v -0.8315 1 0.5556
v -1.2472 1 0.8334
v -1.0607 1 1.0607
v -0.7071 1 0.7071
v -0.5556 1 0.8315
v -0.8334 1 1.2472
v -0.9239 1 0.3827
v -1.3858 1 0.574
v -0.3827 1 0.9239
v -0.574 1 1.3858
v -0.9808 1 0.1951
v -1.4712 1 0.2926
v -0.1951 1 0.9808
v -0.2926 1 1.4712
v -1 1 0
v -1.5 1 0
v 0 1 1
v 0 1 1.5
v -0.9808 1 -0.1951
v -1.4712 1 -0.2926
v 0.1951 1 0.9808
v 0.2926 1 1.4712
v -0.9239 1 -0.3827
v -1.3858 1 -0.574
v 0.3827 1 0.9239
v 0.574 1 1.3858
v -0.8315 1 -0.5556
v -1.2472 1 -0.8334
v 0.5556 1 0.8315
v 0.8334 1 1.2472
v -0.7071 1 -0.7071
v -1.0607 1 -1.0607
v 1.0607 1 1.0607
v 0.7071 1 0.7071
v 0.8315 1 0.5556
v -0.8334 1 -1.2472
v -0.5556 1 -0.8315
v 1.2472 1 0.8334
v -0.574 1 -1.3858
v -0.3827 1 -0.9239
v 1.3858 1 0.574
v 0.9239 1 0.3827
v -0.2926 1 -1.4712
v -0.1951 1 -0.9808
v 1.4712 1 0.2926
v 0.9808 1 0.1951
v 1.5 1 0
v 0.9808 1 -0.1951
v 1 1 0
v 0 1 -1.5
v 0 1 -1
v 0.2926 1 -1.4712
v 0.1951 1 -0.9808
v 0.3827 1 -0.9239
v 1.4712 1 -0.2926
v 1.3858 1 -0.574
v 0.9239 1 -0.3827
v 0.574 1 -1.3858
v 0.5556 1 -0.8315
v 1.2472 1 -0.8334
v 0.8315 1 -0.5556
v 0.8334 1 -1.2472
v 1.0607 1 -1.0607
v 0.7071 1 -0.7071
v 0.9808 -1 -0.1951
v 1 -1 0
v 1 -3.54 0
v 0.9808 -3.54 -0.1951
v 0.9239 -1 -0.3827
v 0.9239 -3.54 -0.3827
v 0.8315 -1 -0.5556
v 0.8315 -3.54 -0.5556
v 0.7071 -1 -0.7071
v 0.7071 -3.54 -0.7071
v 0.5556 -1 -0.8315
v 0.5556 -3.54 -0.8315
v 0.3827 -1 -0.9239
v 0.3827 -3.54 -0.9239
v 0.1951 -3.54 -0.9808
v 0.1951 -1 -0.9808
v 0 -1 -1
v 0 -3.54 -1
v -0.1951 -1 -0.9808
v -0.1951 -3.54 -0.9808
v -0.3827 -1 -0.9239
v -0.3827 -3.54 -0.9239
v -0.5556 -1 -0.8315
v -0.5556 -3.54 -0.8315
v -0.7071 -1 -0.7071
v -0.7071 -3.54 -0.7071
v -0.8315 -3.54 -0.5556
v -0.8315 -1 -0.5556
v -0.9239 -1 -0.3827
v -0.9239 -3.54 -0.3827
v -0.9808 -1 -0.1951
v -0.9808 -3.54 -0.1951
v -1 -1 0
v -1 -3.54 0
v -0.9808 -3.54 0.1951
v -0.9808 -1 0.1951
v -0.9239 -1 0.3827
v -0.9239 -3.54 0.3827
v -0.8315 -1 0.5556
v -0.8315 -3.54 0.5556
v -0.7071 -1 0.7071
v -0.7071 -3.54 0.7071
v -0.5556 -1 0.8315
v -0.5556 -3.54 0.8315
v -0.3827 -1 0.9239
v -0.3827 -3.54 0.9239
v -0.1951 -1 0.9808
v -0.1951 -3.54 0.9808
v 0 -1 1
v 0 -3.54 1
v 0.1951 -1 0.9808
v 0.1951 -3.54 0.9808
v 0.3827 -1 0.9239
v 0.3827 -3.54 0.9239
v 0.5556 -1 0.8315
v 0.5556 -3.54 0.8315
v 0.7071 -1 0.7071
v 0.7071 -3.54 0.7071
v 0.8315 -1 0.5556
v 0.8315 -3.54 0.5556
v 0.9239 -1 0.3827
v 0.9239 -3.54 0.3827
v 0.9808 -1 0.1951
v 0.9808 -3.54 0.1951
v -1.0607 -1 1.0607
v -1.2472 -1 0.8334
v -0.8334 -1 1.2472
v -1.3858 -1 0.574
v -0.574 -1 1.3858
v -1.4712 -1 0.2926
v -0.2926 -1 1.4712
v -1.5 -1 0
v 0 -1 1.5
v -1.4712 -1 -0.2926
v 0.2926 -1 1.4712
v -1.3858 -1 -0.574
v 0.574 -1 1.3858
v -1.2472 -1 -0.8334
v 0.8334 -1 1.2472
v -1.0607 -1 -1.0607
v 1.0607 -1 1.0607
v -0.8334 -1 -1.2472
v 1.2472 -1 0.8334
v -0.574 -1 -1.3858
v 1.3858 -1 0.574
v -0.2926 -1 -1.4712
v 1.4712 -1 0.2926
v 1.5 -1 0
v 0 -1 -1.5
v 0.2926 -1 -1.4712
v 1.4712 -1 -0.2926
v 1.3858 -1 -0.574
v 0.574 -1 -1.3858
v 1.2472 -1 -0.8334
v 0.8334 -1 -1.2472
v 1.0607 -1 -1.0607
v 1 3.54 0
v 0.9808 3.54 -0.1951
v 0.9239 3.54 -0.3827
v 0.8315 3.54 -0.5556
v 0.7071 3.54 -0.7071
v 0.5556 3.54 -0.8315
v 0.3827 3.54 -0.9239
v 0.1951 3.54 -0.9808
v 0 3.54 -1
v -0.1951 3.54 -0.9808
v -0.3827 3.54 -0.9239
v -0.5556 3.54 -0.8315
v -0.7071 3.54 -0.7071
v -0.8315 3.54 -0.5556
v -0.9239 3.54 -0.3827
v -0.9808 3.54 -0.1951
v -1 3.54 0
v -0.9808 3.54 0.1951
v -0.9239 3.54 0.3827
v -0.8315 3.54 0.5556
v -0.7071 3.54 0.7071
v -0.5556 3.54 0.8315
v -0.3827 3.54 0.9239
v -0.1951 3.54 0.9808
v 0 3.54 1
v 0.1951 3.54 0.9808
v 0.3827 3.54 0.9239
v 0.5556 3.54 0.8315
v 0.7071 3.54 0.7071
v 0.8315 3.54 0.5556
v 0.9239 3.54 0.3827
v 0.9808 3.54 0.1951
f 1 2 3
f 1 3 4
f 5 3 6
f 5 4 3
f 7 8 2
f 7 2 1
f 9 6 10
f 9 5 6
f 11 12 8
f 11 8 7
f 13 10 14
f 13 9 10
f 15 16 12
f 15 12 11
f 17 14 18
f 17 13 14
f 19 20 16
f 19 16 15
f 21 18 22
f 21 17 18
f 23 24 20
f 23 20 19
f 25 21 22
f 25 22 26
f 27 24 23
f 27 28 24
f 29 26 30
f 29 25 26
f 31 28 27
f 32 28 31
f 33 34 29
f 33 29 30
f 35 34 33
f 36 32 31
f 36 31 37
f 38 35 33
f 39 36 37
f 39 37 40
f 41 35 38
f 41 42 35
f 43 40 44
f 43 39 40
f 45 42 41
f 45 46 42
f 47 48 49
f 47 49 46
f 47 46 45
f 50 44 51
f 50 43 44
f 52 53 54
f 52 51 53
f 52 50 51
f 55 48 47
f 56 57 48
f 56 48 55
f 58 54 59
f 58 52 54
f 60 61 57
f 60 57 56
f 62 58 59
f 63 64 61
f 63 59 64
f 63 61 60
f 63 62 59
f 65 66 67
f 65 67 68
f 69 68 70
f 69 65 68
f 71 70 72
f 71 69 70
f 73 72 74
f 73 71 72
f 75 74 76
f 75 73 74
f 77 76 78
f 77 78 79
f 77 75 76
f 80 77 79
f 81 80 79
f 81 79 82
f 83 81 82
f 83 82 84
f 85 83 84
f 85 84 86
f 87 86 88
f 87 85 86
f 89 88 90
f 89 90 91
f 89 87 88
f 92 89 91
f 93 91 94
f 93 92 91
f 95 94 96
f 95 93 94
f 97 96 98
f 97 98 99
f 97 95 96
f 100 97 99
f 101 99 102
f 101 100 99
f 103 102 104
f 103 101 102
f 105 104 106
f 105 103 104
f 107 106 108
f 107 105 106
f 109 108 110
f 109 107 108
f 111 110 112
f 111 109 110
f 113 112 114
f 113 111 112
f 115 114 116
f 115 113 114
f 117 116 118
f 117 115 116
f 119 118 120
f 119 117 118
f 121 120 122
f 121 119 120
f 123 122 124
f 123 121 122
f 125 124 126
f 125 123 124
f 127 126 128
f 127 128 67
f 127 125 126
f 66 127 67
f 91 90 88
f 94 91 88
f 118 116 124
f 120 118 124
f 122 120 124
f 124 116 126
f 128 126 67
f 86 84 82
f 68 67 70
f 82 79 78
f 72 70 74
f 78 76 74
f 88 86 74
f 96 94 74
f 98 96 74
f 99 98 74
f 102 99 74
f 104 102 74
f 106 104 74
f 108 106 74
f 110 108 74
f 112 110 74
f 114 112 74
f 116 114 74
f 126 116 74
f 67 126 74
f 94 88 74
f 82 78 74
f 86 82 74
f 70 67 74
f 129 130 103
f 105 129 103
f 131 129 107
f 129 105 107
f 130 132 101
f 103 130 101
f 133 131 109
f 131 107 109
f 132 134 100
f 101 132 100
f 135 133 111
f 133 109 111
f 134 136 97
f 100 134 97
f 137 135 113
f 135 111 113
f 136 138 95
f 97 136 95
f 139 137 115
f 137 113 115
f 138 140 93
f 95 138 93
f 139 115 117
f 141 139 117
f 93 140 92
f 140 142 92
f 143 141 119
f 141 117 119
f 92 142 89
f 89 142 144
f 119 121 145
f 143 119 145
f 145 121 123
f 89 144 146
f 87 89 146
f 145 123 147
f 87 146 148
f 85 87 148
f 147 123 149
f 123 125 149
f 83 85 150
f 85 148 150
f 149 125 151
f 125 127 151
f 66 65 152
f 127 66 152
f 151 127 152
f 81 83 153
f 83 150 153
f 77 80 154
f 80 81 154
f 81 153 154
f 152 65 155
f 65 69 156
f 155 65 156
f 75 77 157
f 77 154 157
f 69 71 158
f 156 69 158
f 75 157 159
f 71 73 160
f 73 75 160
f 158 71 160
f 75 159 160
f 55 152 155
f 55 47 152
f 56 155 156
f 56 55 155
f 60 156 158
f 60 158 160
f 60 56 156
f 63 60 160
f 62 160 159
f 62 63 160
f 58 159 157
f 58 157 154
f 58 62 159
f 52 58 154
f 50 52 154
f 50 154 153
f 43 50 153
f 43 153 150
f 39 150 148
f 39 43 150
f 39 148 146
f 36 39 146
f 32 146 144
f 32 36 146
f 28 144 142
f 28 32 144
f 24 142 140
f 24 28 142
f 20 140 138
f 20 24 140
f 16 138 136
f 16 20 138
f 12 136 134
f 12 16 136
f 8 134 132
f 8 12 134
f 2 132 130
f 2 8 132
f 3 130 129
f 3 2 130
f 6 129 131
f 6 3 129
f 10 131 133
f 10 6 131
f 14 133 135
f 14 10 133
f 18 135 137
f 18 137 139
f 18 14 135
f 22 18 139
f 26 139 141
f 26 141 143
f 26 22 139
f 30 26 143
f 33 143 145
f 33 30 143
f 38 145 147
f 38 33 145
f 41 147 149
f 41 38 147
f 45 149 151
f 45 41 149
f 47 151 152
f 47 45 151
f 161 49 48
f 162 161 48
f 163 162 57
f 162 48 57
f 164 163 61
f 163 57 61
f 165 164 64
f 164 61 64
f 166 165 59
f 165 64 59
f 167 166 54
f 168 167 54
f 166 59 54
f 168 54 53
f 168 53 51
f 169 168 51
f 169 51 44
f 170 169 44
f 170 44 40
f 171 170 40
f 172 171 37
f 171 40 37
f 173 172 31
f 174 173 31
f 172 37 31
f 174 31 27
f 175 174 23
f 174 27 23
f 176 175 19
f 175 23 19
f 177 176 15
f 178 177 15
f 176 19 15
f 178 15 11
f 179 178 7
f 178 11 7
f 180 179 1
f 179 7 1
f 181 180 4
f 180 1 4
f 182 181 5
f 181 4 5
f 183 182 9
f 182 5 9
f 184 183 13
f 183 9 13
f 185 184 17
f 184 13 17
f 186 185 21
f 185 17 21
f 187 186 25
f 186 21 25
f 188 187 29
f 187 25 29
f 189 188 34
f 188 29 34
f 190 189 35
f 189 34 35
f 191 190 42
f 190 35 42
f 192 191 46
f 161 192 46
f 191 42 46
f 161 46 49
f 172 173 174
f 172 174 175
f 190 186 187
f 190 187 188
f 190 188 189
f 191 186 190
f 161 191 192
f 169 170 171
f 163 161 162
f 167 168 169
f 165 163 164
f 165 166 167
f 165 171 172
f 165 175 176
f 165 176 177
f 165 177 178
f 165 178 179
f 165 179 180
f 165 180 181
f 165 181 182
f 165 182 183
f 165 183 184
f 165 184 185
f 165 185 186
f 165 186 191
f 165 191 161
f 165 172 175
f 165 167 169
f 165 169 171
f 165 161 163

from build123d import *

# Parameters (mm, degrees)
SKETCH1_R           = 1.5
BOSS_EXTRUDE1_DEPTH = 1
SKETCH2_R           = 1
BOSS_EXTRUDE2_DEPTH = 2.54


with BuildPart() as part:
    # Sketch1 → Boss-Extrude1 (new body, symmetric)
    with BuildSketch(Plane(origin=(0, 0, 0), x_dir=(1, 0, 0), z_dir=(0, 1, 0))):
        Circle(SKETCH1_R)
    extrude(amount=BOSS_EXTRUDE1_DEPTH, both=True)

    # Sketch2 → Boss-Extrude2 (add)
    with BuildSketch(Plane(origin=(0, 1, 0), x_dir=(1, 0, 0), z_dir=(0, 1, 0))):
        Circle(SKETCH2_R)
    boss_extrude2 = extrude(amount=BOSS_EXTRUDE2_DEPTH)

    # Mirror1: Boss-Extrude2 across plane
    add(boss_extrude2.mirror(Plane.ZX))


solid = part.part
